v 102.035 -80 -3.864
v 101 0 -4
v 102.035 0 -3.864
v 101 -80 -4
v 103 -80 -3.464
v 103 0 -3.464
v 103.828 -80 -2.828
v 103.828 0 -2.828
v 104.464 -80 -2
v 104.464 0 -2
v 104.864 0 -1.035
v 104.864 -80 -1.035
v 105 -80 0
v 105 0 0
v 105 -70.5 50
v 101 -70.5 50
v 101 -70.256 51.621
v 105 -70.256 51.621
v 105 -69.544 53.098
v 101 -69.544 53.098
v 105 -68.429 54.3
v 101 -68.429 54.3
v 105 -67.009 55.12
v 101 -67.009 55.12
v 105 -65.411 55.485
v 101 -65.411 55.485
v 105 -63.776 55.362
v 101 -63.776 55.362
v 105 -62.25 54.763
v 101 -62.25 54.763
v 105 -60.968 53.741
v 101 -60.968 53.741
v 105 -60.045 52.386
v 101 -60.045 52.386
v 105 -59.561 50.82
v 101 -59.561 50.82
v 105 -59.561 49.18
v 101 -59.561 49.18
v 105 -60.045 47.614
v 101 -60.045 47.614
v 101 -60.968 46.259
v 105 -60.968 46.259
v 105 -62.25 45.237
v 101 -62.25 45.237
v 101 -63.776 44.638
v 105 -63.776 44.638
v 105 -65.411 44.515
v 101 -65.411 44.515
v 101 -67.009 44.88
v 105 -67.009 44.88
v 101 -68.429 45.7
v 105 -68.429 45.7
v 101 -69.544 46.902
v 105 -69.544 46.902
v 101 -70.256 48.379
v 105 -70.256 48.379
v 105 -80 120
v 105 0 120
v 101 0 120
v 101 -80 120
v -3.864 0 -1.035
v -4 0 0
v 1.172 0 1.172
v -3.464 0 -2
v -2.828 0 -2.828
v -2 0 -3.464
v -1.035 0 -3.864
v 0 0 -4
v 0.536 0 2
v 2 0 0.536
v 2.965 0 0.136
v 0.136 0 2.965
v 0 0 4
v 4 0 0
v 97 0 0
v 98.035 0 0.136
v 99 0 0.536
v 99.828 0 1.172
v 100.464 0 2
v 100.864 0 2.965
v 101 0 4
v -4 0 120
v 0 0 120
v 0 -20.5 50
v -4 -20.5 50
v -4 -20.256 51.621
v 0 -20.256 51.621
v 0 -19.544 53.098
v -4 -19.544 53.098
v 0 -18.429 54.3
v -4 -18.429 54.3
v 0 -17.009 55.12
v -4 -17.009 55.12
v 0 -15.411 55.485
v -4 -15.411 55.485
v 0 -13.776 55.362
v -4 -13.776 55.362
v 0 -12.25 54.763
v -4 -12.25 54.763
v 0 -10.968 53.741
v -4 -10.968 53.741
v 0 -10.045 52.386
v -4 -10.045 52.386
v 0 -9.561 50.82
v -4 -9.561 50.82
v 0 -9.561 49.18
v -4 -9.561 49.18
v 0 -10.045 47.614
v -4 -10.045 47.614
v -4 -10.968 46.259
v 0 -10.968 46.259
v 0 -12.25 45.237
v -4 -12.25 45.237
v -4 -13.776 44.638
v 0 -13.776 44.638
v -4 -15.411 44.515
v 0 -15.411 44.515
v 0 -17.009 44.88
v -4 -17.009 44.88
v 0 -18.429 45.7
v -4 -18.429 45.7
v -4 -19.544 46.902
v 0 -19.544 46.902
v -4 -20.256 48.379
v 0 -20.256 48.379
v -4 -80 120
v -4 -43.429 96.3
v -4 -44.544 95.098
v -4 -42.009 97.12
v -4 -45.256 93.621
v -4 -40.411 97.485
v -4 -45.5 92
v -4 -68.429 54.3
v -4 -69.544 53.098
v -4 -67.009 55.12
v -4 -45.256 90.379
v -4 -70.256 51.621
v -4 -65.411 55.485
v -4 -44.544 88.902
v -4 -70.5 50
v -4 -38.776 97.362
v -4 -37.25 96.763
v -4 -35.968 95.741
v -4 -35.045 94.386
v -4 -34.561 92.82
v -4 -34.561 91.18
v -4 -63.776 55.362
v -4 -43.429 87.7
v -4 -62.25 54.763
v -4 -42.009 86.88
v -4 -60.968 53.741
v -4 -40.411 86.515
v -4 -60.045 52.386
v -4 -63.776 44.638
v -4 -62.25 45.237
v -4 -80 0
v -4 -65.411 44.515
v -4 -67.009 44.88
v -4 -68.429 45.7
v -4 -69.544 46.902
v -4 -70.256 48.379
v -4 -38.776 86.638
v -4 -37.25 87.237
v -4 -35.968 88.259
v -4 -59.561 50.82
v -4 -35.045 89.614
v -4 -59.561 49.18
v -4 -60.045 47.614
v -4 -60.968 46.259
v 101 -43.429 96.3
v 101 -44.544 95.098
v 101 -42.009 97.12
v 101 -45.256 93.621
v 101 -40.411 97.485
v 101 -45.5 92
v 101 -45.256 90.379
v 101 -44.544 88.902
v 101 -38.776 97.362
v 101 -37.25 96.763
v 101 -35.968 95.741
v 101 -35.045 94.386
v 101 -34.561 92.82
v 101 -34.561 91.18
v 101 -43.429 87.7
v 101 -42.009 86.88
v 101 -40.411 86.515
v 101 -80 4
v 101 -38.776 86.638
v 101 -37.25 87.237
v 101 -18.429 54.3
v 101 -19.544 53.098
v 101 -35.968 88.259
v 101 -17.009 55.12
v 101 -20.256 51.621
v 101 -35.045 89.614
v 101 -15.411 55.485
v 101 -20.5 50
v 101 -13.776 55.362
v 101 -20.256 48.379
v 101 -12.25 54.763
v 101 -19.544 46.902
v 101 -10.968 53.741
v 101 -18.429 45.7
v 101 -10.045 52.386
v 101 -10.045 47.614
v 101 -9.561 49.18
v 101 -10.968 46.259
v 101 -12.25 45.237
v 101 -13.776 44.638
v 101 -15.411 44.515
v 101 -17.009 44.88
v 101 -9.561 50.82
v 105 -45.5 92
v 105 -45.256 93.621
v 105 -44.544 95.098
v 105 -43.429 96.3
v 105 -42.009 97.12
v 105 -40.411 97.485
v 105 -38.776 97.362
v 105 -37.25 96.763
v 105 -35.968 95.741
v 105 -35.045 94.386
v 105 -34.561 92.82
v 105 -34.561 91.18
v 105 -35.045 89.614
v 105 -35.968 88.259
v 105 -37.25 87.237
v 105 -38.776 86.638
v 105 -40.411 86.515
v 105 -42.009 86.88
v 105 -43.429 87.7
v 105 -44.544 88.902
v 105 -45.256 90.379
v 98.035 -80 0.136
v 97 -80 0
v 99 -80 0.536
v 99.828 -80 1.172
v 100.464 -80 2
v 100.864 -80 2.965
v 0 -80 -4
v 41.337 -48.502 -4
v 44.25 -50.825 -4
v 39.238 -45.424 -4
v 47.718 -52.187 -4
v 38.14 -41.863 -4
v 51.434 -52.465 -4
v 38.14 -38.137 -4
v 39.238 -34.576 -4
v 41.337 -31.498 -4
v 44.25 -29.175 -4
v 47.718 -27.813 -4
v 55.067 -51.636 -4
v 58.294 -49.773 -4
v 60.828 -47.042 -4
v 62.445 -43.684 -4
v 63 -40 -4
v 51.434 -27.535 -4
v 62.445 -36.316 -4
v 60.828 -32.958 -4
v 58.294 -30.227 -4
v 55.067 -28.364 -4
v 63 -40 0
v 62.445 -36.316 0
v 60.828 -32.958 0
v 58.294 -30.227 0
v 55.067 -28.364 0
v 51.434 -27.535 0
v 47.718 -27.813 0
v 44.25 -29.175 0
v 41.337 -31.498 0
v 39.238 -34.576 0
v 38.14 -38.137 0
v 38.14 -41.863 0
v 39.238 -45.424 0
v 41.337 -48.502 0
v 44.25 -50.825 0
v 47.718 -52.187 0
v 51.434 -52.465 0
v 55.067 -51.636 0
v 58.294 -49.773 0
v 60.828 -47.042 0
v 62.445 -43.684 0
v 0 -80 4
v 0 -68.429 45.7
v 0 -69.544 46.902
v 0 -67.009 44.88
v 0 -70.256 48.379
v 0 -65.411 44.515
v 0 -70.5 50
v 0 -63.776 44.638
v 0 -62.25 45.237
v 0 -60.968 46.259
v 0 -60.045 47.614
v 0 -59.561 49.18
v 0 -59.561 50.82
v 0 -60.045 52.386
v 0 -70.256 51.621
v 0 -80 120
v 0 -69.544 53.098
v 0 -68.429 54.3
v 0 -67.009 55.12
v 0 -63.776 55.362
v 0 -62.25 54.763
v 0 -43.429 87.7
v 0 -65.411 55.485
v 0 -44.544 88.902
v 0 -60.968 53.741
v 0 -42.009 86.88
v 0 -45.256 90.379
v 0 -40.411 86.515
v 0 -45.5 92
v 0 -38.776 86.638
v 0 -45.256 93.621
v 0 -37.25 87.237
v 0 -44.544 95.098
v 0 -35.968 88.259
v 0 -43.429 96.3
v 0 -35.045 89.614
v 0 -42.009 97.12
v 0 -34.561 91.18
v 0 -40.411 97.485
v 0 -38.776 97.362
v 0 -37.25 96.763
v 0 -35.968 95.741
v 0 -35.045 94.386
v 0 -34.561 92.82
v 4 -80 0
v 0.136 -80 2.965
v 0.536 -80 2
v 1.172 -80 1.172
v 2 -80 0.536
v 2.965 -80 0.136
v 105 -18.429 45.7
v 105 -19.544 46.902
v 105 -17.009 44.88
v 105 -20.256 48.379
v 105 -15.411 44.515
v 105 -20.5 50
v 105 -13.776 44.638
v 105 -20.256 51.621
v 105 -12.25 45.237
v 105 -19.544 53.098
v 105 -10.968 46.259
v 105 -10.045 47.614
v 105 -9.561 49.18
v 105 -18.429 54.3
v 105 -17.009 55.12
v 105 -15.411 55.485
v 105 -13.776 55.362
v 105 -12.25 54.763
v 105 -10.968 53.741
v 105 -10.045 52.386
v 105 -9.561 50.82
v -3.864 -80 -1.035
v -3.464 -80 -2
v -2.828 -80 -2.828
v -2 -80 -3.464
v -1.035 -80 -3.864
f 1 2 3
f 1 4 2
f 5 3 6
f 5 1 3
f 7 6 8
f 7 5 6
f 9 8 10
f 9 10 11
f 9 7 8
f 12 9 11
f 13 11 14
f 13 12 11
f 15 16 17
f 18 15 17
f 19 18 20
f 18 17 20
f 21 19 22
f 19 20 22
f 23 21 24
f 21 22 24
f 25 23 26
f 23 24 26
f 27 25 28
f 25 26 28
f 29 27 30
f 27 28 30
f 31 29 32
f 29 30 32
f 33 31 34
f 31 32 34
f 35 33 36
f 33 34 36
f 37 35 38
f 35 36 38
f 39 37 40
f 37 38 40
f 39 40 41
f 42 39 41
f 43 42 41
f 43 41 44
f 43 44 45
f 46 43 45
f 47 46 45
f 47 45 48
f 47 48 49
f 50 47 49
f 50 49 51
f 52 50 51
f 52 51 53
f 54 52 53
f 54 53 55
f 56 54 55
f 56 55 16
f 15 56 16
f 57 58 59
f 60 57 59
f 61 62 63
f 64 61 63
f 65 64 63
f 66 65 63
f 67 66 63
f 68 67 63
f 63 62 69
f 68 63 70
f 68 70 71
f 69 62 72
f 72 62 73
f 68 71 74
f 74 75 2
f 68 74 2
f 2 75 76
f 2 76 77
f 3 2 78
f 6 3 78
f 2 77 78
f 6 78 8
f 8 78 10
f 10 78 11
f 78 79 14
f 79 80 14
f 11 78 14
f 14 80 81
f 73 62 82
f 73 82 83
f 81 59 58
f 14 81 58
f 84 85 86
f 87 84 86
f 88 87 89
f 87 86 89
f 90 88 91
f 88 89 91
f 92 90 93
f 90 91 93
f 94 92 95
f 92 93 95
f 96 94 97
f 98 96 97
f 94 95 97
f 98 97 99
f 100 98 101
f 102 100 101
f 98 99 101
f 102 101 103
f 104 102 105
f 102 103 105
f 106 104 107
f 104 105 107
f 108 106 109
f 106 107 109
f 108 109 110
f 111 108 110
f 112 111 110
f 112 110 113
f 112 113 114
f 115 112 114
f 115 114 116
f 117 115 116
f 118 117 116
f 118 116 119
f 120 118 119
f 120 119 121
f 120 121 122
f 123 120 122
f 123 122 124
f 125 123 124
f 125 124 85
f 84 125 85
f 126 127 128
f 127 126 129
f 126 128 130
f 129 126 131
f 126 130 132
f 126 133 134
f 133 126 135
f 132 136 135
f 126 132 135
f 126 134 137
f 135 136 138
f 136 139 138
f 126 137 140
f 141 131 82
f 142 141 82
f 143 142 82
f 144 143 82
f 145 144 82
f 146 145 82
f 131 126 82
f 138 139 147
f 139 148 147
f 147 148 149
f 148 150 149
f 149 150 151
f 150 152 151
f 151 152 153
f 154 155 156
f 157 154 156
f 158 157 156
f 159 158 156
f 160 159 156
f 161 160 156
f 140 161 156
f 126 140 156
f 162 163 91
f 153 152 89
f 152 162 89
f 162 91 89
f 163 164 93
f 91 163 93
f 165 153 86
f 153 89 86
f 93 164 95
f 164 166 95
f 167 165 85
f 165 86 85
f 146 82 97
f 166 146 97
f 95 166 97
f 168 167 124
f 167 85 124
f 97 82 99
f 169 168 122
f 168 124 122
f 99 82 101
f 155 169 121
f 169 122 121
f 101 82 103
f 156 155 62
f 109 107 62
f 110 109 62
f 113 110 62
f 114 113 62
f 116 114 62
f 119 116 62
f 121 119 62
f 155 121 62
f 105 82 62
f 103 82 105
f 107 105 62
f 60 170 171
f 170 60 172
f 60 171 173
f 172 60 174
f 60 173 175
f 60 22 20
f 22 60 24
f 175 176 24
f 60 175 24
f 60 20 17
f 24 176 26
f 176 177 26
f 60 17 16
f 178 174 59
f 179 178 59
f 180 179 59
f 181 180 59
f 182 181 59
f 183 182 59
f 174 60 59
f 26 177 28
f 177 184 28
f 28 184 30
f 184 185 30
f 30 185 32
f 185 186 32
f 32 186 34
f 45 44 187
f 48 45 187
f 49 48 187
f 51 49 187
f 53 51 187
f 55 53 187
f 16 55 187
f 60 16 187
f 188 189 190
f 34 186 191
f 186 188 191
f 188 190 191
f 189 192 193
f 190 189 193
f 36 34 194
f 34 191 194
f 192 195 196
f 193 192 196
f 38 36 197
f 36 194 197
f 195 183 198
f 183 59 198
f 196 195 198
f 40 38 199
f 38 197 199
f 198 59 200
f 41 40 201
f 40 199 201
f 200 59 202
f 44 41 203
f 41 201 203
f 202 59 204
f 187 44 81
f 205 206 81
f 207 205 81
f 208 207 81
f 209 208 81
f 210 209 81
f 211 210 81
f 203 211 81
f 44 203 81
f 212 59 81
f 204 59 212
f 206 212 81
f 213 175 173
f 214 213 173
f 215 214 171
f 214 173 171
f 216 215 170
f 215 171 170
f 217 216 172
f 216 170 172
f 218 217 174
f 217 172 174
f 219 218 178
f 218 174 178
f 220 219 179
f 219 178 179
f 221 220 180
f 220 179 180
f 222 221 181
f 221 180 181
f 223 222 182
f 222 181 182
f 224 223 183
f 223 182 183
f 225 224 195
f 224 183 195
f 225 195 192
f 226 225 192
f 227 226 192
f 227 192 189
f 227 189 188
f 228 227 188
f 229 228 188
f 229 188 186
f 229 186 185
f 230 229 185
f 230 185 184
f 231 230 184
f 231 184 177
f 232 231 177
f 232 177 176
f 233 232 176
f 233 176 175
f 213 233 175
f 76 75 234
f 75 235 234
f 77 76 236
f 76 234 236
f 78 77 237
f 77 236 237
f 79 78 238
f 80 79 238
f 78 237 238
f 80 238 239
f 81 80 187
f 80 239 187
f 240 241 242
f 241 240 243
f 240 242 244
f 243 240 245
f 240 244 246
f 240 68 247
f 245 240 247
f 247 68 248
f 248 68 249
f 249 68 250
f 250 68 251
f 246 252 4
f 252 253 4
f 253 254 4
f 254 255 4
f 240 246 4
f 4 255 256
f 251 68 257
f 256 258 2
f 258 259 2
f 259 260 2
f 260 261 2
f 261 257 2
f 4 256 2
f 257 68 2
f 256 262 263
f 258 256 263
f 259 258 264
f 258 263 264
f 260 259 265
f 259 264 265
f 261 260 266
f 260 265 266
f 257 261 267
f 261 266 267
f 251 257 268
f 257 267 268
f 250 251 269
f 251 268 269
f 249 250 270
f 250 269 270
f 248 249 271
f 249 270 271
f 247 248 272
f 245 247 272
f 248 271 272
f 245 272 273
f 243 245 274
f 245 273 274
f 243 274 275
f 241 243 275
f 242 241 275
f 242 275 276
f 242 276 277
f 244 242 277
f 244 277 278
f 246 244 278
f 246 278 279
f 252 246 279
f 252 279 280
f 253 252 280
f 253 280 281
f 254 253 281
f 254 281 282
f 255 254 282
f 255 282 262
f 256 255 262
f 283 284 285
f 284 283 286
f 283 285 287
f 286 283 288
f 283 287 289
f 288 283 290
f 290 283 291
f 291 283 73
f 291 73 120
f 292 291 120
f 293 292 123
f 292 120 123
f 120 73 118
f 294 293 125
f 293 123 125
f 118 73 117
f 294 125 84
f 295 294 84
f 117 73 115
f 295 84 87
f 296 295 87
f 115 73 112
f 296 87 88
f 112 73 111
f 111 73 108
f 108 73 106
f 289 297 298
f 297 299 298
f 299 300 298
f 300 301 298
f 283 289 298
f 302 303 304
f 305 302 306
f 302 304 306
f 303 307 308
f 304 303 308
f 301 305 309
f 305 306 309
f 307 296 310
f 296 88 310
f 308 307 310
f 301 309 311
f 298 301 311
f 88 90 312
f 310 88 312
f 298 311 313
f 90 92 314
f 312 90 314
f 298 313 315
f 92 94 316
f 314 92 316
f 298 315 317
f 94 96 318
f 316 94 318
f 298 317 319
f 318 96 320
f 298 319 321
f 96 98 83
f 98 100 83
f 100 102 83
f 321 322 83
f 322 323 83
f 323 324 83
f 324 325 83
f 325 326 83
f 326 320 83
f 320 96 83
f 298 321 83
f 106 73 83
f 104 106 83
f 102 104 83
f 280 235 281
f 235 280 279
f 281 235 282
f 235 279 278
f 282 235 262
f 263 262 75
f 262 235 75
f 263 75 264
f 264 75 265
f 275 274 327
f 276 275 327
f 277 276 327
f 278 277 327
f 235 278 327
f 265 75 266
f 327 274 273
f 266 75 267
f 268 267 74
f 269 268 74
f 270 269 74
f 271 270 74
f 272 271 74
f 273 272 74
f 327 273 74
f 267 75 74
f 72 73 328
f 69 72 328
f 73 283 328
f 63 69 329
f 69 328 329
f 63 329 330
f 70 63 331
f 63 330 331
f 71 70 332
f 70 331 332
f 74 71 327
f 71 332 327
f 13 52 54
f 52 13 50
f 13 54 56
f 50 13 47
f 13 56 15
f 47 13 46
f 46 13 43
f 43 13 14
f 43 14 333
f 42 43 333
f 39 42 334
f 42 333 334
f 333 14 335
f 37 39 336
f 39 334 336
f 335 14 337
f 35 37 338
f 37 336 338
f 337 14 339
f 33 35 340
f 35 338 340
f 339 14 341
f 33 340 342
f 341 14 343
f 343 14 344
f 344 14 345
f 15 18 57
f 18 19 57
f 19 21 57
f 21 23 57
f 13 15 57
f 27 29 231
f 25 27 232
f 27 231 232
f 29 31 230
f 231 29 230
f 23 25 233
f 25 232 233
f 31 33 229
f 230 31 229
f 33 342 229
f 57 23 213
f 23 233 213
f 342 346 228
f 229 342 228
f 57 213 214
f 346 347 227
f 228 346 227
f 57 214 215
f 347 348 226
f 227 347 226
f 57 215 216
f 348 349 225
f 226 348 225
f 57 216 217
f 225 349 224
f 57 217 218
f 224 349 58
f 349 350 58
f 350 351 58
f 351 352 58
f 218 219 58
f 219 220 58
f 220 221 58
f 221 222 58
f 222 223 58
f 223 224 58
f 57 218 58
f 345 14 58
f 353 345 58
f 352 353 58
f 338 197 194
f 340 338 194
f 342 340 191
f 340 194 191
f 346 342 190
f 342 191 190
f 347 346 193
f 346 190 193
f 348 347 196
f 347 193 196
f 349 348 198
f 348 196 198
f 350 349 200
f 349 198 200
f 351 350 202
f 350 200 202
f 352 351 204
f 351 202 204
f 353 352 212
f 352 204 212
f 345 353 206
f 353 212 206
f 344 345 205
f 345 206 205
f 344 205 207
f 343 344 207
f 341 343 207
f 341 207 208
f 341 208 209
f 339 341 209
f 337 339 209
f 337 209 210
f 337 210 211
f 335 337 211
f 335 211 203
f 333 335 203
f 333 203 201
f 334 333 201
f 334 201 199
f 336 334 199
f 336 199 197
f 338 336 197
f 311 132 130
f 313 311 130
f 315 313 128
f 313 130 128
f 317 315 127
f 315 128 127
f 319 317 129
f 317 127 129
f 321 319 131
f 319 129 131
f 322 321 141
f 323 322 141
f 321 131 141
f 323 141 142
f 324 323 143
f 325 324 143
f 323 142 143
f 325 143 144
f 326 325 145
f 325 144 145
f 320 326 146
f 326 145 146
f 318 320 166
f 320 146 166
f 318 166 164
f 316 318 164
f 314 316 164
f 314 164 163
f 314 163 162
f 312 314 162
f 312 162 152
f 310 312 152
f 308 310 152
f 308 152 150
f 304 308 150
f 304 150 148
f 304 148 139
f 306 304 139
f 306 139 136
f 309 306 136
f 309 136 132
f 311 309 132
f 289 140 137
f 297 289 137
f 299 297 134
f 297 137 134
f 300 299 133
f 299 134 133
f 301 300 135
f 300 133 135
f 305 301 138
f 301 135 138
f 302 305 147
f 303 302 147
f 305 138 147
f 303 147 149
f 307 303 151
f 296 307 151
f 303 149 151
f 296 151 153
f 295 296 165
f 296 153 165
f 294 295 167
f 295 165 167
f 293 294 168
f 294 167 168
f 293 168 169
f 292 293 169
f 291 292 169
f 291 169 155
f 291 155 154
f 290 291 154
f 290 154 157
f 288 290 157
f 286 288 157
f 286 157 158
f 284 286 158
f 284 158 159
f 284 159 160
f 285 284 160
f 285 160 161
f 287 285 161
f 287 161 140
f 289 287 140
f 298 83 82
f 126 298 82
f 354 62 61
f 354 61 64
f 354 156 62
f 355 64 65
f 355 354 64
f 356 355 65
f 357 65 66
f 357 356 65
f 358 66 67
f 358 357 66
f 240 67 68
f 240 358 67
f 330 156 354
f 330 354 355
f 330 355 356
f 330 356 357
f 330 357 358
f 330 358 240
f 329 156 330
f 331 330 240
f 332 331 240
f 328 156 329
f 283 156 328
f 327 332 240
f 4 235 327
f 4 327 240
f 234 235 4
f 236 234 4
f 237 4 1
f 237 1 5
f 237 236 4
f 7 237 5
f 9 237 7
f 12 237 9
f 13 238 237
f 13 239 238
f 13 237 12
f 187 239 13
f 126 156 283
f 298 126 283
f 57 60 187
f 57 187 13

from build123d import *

# Parameters (mm, degrees)
F1_DEPTH = 80
F2_R     = 12.5
F3_DEPTH = 4.001
F4_R     = 5.5
F5_DEPTH = 109.001
F6_R     = 4


with BuildPart() as f1:
    # F0 (on Front) → F1 (new body)
    with BuildSketch(Plane.XZ):
        Polygon((0, 0), (0, 120), (-4, 120), (-4, -4), (105, -4), (105, 120), (101, 120), (101, 0), align=None)
    extrude(amount=F1_DEPTH)

    # F2 (on face) → F3 (cut, through all)
    with BuildSketch(Plane.XY):
        with Locations((50.5, -40)):
            Circle(F2_R)
    extrude(amount=-F3_DEPTH, mode=Mode.SUBTRACT)

    # F4 (on face) → F5 (cut, through all)
    with BuildSketch(Plane(origin=(-4, 0, 0), x_dir=(0, -1, 0), z_dir=(-1, 0, 0))):
        with Locations((65, 50)):
            Circle(F4_R)
        with Locations((40, 92)):
            Circle(F4_R)
        with Locations((15, 50)):
            Circle(F4_R)
    extrude(amount=-F5_DEPTH, mode=Mode.SUBTRACT)

    # F6
    f6_edges = [f1.edges().sort_by_distance(p)[0] for p in [
        (0, -40, 0),
        (101, -40, 0),
        (-4, -40, -4),
        (105, -40, -4),
    ]]
    fillet(f6_edges, radius=F6_R)


solid = f1.part
